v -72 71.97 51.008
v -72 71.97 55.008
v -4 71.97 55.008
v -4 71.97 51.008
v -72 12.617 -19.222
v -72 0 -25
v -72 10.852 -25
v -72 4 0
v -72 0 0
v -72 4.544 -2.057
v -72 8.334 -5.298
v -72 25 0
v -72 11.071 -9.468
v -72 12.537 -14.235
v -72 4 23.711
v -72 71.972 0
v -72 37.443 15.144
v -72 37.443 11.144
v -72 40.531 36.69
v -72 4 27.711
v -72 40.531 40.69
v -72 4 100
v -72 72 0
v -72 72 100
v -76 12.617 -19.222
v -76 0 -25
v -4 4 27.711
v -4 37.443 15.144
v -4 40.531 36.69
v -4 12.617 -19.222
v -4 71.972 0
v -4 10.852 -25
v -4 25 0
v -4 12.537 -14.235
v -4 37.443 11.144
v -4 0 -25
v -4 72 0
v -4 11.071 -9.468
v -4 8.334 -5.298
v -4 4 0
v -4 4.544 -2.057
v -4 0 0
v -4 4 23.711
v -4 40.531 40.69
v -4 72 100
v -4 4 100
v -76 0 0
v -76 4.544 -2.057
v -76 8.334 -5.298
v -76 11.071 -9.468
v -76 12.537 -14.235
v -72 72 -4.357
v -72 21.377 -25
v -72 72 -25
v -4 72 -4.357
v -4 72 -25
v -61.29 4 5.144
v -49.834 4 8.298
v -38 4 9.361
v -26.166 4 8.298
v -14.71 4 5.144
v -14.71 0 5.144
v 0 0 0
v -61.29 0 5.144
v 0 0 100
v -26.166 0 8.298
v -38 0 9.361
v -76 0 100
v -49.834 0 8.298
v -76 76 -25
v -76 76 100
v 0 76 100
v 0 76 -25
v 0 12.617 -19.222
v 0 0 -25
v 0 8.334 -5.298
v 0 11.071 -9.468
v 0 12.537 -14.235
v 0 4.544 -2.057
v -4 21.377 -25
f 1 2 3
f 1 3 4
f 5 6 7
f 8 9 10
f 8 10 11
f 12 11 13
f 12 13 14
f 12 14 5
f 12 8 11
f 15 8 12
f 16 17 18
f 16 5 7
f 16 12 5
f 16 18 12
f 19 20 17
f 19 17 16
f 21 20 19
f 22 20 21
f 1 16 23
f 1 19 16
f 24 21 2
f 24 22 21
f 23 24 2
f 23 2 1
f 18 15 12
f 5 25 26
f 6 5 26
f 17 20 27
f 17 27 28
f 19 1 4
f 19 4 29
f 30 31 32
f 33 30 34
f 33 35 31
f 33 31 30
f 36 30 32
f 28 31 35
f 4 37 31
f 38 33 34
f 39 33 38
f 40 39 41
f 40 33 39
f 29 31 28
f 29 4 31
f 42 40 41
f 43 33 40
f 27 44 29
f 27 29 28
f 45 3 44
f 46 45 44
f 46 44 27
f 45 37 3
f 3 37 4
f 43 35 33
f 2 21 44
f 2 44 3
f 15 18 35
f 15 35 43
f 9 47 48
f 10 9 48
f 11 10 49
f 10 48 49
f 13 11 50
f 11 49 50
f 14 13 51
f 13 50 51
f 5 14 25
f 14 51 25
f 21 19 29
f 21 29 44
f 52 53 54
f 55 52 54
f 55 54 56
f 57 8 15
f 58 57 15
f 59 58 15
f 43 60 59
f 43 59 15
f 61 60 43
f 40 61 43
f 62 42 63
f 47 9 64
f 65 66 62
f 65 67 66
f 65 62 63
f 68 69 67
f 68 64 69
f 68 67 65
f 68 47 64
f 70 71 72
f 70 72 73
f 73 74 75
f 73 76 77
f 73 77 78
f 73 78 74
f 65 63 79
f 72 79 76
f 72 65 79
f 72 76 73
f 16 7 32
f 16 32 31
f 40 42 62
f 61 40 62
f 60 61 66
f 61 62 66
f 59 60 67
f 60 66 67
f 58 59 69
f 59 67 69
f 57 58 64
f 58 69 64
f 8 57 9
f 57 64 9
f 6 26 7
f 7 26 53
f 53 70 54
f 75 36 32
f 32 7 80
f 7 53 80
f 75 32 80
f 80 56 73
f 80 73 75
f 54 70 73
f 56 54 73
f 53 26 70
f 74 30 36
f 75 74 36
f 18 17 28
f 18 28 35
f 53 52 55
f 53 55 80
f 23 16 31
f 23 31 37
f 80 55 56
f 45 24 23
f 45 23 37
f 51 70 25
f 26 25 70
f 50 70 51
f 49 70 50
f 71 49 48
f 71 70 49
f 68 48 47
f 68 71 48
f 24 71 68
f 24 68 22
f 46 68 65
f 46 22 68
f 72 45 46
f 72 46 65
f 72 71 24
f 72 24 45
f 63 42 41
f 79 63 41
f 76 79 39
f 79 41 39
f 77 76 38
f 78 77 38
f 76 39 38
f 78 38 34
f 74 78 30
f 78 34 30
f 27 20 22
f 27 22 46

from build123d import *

# Parameters (mm, degrees)
F0_W      = 76
F0_H      = 76
F0_W_2    = 68
F0_H_2    = 68
F1_DEPTH  = 100
F2_W      = 68
F2_H      = 4
F3_DEPTH  = 25
F5_DEPTH  = 72
F7_DEPTH  = 76
F9_DEPTH  = 25
F11_DEPTH = 72


with BuildPart() as f1:
    # F0 (on Top) → F1 (new body)
    with BuildSketch(Plane.XY):
        with Locations((-38, 38)):
            Rectangle(F0_W, F0_H)
        with Locations((-38, 38)):
            Rectangle(F0_W_2, F0_H_2, mode=Mode.SUBTRACT)
    extrude(amount=F1_DEPTH)

    # F2 (on face) → F3 (join)
    with BuildSketch(Plane.XY):
        Polygon((-76, 76), (-76, 0), (-72, 0), (-72, 72), (-72, 76), align=None)
        with Locations((-38, 74)):
            Rectangle(F2_W, F2_H)
        Polygon((-4, 76), (-4, 72), (-4, 0), (0, 0), (0, 76), align=None)
    extrude(amount=-F3_DEPTH)

    # F4 (on face) → F5 (join, through all)
    with BuildSketch(Plane(origin=(-76, 0, 0), x_dir=(0, -1, 0), z_dir=(-1, 0, 0))):
        Polygon((-10.85203, -25), (-71.971662, 0), (-76, 0), (-76, -2.726357), (-21.37715, -25), align=None)
    extrude(amount=-F5_DEPTH)

    # F6 (on face) → F7 (cut, through all)
    with BuildSketch(Plane(origin=(-76, 0, 0), x_dir=(0, -1, 0), z_dir=(-1, 0, 0))):
        with BuildLine():
            Line((0, -25), (0, 0))
            ThreePointArc((0, 0), (-9.849808, -7.286393), (-12.617335, -19.221678))
            Line((-12.617335, -19.221678), (0, -25))
        make_face()
    extrude(amount=-F7_DEPTH, mode=Mode.SUBTRACT)

    # F8 (on face) → F9 (cut)
    with BuildSketch(Plane.XZ):
        with BuildLine():
            Line((-72, 0), (-4, 0))
            ThreePointArc((-4, 0), (-38, 9.360839), (-72, 0))
        make_face()
    extrude(amount=-F9_DEPTH, mode=Mode.SUBTRACT)

    # F10 (on face) → F11 (join, through all)
    with BuildSketch(Plane(origin=(-76, 0, 0), x_dir=(0, -1, 0), z_dir=(-1, 0, 0))):
        Polygon((-37.44344, 15.143791), (-37.44344, 11.143791), (0, 25.214639), (0, 29.214639), align=None)
        Polygon((-71.970133, 51.007654), (-40.531019, 36.690459), (-40.531019, 40.690459), (-71.970133, 55.007654), align=None)
    extrude(amount=-F11_DEPTH)


solid = f1.part
